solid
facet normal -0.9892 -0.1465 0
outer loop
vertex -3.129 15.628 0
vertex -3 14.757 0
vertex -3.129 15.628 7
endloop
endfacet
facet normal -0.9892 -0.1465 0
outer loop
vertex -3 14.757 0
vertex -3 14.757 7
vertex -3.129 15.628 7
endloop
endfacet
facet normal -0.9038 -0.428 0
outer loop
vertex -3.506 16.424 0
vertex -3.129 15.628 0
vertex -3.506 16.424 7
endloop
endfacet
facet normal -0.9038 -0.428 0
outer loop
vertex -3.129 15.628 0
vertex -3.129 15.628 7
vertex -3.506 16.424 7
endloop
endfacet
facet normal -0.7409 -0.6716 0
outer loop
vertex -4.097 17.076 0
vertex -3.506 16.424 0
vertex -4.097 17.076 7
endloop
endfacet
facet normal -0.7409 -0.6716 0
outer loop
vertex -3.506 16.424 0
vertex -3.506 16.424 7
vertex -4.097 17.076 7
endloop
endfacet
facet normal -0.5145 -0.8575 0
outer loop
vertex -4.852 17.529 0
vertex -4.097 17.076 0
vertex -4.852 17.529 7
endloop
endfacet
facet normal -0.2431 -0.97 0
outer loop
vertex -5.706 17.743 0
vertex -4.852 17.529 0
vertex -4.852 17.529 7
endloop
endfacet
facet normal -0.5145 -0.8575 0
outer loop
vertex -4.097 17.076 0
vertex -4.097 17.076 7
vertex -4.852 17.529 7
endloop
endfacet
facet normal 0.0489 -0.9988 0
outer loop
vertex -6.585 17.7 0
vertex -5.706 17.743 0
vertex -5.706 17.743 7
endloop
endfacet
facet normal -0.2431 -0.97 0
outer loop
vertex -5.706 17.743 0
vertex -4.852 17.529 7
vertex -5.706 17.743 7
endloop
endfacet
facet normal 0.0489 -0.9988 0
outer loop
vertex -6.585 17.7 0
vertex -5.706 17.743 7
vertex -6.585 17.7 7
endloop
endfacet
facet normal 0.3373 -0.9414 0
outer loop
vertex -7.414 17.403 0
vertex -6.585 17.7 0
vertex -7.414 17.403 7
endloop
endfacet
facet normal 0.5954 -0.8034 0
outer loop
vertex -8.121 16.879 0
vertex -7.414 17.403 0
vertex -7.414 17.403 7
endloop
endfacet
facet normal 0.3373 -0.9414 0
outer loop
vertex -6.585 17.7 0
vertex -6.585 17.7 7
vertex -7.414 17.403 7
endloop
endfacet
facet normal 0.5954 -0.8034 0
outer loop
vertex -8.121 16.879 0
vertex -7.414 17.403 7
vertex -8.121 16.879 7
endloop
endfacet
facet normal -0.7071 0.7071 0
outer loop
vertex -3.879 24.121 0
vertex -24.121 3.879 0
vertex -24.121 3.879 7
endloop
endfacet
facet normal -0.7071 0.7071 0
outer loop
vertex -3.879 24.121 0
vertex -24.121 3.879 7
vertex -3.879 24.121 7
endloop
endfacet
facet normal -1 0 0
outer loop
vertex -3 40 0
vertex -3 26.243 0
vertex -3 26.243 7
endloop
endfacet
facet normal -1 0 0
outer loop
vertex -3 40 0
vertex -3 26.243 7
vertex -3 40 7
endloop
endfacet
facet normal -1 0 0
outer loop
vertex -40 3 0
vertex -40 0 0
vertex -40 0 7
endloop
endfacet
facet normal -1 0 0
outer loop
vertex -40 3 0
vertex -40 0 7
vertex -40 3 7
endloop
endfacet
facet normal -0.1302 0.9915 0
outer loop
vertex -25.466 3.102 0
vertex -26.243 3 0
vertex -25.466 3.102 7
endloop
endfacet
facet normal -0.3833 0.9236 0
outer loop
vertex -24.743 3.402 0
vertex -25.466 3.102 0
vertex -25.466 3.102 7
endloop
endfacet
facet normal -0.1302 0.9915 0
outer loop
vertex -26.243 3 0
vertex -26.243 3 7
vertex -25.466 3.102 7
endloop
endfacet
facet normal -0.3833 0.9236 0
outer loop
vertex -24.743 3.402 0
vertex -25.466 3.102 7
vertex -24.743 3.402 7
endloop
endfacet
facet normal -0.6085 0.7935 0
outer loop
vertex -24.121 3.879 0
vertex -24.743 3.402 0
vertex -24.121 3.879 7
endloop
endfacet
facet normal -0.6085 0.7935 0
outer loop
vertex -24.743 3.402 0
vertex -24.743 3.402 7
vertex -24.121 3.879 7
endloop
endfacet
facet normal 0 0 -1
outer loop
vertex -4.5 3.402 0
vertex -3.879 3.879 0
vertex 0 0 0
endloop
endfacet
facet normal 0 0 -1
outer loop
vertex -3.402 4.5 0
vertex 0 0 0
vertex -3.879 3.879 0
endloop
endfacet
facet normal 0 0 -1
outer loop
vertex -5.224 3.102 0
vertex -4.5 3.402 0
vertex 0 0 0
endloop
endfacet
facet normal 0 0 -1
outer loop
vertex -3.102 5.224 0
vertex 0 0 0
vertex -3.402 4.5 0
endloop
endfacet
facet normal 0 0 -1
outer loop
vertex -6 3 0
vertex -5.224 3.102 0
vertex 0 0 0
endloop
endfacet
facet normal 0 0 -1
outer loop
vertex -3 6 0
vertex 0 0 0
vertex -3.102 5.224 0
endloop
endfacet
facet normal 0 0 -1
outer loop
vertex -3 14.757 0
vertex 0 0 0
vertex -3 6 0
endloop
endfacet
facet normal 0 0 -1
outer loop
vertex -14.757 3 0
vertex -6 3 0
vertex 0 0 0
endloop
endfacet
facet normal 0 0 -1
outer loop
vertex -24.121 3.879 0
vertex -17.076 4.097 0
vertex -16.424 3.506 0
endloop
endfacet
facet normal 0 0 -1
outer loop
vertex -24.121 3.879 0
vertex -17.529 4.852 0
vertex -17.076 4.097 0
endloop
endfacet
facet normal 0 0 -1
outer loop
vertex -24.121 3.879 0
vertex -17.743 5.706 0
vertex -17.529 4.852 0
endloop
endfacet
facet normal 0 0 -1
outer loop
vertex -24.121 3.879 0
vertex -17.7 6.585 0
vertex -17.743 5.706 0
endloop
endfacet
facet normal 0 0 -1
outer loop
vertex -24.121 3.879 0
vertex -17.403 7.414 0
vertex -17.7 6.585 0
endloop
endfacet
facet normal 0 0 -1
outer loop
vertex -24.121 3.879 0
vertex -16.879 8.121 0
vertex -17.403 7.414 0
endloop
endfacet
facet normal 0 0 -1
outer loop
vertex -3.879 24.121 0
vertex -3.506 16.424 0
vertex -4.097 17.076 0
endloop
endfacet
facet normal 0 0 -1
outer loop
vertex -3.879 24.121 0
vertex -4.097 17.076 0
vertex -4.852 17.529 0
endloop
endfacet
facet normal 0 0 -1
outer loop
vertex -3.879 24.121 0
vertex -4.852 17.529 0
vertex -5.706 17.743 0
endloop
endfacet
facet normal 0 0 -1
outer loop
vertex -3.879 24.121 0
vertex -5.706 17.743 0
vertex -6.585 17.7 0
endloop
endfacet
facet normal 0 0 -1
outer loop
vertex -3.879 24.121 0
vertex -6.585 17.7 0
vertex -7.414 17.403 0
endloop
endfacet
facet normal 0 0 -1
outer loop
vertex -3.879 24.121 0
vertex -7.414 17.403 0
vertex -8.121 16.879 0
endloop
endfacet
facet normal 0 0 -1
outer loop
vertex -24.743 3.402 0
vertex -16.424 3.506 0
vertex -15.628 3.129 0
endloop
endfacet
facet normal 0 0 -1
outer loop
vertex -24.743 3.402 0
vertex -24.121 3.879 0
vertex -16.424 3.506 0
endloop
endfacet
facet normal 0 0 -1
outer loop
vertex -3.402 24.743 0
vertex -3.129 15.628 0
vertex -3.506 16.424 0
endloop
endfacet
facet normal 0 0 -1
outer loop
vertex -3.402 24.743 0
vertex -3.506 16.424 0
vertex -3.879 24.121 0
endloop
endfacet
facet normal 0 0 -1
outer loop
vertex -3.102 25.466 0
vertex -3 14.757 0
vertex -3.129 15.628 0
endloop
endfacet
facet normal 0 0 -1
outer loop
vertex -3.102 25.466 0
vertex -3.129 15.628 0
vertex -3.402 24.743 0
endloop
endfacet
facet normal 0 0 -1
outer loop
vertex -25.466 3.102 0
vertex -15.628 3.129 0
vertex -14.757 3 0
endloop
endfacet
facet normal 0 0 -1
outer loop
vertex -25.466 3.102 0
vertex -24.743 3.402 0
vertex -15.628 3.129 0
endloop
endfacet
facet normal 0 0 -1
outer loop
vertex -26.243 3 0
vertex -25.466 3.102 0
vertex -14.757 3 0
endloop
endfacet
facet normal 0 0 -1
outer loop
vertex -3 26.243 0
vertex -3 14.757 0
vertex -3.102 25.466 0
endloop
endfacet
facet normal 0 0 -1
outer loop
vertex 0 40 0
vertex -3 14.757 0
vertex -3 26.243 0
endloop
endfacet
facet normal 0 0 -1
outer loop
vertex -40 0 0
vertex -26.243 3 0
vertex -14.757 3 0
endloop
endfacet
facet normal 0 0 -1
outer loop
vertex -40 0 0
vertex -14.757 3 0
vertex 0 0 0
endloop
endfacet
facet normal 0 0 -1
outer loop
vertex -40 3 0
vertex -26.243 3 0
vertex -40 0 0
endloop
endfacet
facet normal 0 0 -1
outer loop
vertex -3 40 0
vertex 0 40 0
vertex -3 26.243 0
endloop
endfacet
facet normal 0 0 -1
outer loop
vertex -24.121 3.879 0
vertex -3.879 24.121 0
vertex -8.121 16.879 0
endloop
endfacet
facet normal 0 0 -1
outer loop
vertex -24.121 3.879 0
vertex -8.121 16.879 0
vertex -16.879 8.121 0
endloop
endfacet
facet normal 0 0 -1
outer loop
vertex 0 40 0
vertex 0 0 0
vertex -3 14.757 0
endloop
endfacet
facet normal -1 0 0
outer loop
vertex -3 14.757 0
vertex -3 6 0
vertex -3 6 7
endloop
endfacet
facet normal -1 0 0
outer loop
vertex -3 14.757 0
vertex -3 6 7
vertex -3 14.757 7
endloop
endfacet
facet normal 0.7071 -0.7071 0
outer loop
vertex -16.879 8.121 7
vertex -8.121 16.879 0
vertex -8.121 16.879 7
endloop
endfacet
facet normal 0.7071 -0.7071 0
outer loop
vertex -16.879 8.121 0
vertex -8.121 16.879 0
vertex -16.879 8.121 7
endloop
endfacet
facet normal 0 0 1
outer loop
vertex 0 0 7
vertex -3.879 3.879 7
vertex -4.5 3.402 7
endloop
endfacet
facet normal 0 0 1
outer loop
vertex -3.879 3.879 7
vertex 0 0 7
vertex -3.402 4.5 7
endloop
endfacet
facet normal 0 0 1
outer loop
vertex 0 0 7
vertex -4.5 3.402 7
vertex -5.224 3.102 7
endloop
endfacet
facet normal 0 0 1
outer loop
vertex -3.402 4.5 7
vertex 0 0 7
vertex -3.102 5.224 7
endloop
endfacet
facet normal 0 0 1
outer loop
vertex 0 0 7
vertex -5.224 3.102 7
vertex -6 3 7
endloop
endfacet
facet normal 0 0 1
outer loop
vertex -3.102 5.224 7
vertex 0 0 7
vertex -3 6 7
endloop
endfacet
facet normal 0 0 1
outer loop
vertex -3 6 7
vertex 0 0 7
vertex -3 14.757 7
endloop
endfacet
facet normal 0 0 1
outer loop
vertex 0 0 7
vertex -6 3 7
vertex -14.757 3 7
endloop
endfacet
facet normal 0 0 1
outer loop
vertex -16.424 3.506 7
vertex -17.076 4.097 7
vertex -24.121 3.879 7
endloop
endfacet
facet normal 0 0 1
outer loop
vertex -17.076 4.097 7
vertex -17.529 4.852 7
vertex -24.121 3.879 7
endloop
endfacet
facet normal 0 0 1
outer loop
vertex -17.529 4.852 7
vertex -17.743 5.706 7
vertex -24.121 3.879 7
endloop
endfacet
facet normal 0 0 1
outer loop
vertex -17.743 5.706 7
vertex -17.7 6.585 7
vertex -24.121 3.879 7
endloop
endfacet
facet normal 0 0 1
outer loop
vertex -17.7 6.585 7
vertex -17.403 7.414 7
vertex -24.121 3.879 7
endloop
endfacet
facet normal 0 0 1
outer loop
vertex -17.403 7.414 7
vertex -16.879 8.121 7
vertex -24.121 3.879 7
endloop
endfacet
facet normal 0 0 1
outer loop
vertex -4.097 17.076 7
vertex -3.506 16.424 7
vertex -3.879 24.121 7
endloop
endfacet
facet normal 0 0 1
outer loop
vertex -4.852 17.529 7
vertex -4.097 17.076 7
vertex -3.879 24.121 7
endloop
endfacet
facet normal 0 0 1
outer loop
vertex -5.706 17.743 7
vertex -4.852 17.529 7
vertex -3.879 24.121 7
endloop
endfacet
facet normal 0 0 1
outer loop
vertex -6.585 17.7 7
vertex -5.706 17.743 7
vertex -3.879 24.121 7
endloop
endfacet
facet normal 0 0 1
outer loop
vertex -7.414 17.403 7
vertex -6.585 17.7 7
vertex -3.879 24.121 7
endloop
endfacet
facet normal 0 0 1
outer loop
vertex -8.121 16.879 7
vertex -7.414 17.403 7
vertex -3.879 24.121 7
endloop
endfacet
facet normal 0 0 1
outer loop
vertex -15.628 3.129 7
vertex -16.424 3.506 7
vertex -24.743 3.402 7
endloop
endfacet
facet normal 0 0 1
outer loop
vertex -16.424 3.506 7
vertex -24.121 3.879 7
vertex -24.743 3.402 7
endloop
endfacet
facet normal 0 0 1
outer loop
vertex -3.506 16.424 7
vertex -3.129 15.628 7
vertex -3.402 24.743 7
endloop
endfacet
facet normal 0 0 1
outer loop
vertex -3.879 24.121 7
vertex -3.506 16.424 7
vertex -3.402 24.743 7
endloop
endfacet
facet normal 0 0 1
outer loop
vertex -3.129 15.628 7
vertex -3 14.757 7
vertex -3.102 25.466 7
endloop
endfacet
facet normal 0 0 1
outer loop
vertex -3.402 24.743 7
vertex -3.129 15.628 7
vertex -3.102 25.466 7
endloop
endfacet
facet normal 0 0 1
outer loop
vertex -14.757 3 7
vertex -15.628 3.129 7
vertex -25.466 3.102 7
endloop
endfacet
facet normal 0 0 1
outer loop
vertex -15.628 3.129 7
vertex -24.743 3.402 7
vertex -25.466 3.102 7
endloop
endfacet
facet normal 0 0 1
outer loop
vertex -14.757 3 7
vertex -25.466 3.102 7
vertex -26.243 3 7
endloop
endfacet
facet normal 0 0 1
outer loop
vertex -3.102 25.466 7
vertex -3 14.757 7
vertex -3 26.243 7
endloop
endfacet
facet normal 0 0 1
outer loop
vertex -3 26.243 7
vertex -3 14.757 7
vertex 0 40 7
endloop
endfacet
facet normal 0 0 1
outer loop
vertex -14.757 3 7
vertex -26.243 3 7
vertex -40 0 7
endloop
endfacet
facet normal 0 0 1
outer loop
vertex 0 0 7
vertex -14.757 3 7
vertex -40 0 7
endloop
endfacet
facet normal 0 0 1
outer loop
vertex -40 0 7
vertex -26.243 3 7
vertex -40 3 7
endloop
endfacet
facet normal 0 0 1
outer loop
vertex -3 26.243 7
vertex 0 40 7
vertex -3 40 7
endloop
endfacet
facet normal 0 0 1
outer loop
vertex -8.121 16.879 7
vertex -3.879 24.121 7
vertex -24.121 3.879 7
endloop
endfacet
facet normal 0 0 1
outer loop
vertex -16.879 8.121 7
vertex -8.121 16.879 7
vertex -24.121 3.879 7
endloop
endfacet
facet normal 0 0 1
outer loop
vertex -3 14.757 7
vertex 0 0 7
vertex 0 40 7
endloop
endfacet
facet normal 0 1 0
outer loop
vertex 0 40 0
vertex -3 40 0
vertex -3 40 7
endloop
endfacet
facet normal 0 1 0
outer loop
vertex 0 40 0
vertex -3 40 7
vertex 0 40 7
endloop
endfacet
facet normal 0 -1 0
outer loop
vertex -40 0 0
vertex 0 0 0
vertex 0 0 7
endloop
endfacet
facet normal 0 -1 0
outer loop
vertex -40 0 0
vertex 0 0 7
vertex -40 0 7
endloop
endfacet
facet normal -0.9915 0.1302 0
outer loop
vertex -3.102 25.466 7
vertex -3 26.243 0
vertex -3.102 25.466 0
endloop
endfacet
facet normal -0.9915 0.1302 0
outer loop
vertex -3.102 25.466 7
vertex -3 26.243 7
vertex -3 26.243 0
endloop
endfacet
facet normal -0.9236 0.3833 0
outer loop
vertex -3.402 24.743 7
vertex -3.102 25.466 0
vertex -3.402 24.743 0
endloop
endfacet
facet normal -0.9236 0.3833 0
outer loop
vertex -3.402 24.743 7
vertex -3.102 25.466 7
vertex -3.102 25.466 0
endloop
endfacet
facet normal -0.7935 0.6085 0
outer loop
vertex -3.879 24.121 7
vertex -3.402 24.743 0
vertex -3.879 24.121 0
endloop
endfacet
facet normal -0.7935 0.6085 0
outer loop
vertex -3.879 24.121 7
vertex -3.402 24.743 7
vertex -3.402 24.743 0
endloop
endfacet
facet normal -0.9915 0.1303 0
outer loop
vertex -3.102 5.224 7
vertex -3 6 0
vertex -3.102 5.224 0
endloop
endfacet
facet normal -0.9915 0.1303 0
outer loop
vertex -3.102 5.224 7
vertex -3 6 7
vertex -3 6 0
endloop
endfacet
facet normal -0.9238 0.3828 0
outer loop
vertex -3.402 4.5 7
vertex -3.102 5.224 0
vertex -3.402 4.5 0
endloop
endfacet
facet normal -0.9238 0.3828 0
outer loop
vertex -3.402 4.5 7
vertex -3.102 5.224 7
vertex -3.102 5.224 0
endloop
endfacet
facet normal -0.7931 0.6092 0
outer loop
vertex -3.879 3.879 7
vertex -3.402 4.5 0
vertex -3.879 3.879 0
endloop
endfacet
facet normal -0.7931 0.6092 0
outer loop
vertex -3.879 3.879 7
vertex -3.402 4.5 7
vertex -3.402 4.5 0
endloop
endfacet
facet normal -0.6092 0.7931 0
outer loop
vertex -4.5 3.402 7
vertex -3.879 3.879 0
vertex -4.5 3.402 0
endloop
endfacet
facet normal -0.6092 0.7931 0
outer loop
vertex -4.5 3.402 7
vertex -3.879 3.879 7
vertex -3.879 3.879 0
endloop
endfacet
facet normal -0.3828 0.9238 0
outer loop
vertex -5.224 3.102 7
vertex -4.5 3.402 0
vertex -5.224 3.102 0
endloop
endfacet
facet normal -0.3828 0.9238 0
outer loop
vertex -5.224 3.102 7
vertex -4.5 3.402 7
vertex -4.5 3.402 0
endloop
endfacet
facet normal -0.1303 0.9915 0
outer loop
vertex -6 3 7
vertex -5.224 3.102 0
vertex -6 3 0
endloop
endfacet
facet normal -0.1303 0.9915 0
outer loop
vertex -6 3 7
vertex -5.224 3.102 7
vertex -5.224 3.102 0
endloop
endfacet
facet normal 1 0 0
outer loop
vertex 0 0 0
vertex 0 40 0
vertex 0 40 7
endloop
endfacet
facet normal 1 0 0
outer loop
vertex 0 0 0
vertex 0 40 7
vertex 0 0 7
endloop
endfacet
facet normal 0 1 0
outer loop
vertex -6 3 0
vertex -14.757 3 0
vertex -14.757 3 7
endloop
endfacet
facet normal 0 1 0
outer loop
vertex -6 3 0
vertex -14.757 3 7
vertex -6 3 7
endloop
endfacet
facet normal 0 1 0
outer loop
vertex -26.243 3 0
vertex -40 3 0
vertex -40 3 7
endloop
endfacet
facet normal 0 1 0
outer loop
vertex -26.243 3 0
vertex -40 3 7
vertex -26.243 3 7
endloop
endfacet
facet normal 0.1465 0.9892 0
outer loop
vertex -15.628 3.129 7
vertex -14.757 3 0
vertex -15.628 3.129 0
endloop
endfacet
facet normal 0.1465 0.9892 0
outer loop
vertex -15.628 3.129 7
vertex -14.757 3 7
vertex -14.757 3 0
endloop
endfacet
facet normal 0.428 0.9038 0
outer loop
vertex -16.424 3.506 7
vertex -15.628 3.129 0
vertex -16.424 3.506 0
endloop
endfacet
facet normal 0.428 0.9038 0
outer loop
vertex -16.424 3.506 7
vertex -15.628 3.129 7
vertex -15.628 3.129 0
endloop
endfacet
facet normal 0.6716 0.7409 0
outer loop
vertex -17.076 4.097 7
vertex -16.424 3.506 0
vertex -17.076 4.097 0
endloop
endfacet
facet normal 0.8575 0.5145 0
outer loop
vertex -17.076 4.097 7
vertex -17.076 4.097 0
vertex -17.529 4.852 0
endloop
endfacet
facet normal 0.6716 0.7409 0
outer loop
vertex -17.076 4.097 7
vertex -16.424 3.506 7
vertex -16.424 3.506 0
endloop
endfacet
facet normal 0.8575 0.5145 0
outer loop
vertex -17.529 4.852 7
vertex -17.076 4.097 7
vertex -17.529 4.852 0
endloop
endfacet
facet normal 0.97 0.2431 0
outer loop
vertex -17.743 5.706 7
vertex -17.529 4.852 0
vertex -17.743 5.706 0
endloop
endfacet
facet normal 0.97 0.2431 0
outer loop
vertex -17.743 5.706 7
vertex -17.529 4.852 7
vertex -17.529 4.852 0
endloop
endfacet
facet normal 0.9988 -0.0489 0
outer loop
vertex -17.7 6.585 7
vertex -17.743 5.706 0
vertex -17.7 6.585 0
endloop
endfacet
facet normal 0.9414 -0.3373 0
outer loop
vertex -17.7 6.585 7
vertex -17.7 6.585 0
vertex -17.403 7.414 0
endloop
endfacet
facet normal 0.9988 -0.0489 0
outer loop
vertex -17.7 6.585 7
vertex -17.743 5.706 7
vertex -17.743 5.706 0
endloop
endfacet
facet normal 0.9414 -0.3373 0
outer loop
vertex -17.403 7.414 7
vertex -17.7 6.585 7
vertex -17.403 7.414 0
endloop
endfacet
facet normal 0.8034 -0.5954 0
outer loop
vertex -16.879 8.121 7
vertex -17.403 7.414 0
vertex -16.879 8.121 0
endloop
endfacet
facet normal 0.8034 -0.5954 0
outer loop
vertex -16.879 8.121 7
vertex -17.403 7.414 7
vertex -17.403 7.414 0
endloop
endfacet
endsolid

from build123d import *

# Parameters (mm, degrees)
PAD_DEPTH = 7
FILLET_R  = 3


with BuildPart() as part:
    # Sketch → Pad (new body)
    with BuildSketch(Plane.XY):
        Polygon((0, 0), (-40, 0), (-40, 3), (-25, 3), (-3, 25), (-3, 40), (0, 40), align=None)
        Polygon((-3, 22), (-22, 3), (-3, 3), align=None, mode=Mode.SUBTRACT)
    extrude(amount=PAD_DEPTH)

    # Fillet
    fillet_edges = [part.edges().sort_by_distance(p)[0] for p in [
        (-22, 3, 3.5),
        (-25, 3, 3.5),
        (-3, 22, 3.5),
        (-3, 25, 3.5),
        (-3, 3, 3.5),
    ]]
    fillet(fillet_edges, radius=FILLET_R)


solid = part.part
